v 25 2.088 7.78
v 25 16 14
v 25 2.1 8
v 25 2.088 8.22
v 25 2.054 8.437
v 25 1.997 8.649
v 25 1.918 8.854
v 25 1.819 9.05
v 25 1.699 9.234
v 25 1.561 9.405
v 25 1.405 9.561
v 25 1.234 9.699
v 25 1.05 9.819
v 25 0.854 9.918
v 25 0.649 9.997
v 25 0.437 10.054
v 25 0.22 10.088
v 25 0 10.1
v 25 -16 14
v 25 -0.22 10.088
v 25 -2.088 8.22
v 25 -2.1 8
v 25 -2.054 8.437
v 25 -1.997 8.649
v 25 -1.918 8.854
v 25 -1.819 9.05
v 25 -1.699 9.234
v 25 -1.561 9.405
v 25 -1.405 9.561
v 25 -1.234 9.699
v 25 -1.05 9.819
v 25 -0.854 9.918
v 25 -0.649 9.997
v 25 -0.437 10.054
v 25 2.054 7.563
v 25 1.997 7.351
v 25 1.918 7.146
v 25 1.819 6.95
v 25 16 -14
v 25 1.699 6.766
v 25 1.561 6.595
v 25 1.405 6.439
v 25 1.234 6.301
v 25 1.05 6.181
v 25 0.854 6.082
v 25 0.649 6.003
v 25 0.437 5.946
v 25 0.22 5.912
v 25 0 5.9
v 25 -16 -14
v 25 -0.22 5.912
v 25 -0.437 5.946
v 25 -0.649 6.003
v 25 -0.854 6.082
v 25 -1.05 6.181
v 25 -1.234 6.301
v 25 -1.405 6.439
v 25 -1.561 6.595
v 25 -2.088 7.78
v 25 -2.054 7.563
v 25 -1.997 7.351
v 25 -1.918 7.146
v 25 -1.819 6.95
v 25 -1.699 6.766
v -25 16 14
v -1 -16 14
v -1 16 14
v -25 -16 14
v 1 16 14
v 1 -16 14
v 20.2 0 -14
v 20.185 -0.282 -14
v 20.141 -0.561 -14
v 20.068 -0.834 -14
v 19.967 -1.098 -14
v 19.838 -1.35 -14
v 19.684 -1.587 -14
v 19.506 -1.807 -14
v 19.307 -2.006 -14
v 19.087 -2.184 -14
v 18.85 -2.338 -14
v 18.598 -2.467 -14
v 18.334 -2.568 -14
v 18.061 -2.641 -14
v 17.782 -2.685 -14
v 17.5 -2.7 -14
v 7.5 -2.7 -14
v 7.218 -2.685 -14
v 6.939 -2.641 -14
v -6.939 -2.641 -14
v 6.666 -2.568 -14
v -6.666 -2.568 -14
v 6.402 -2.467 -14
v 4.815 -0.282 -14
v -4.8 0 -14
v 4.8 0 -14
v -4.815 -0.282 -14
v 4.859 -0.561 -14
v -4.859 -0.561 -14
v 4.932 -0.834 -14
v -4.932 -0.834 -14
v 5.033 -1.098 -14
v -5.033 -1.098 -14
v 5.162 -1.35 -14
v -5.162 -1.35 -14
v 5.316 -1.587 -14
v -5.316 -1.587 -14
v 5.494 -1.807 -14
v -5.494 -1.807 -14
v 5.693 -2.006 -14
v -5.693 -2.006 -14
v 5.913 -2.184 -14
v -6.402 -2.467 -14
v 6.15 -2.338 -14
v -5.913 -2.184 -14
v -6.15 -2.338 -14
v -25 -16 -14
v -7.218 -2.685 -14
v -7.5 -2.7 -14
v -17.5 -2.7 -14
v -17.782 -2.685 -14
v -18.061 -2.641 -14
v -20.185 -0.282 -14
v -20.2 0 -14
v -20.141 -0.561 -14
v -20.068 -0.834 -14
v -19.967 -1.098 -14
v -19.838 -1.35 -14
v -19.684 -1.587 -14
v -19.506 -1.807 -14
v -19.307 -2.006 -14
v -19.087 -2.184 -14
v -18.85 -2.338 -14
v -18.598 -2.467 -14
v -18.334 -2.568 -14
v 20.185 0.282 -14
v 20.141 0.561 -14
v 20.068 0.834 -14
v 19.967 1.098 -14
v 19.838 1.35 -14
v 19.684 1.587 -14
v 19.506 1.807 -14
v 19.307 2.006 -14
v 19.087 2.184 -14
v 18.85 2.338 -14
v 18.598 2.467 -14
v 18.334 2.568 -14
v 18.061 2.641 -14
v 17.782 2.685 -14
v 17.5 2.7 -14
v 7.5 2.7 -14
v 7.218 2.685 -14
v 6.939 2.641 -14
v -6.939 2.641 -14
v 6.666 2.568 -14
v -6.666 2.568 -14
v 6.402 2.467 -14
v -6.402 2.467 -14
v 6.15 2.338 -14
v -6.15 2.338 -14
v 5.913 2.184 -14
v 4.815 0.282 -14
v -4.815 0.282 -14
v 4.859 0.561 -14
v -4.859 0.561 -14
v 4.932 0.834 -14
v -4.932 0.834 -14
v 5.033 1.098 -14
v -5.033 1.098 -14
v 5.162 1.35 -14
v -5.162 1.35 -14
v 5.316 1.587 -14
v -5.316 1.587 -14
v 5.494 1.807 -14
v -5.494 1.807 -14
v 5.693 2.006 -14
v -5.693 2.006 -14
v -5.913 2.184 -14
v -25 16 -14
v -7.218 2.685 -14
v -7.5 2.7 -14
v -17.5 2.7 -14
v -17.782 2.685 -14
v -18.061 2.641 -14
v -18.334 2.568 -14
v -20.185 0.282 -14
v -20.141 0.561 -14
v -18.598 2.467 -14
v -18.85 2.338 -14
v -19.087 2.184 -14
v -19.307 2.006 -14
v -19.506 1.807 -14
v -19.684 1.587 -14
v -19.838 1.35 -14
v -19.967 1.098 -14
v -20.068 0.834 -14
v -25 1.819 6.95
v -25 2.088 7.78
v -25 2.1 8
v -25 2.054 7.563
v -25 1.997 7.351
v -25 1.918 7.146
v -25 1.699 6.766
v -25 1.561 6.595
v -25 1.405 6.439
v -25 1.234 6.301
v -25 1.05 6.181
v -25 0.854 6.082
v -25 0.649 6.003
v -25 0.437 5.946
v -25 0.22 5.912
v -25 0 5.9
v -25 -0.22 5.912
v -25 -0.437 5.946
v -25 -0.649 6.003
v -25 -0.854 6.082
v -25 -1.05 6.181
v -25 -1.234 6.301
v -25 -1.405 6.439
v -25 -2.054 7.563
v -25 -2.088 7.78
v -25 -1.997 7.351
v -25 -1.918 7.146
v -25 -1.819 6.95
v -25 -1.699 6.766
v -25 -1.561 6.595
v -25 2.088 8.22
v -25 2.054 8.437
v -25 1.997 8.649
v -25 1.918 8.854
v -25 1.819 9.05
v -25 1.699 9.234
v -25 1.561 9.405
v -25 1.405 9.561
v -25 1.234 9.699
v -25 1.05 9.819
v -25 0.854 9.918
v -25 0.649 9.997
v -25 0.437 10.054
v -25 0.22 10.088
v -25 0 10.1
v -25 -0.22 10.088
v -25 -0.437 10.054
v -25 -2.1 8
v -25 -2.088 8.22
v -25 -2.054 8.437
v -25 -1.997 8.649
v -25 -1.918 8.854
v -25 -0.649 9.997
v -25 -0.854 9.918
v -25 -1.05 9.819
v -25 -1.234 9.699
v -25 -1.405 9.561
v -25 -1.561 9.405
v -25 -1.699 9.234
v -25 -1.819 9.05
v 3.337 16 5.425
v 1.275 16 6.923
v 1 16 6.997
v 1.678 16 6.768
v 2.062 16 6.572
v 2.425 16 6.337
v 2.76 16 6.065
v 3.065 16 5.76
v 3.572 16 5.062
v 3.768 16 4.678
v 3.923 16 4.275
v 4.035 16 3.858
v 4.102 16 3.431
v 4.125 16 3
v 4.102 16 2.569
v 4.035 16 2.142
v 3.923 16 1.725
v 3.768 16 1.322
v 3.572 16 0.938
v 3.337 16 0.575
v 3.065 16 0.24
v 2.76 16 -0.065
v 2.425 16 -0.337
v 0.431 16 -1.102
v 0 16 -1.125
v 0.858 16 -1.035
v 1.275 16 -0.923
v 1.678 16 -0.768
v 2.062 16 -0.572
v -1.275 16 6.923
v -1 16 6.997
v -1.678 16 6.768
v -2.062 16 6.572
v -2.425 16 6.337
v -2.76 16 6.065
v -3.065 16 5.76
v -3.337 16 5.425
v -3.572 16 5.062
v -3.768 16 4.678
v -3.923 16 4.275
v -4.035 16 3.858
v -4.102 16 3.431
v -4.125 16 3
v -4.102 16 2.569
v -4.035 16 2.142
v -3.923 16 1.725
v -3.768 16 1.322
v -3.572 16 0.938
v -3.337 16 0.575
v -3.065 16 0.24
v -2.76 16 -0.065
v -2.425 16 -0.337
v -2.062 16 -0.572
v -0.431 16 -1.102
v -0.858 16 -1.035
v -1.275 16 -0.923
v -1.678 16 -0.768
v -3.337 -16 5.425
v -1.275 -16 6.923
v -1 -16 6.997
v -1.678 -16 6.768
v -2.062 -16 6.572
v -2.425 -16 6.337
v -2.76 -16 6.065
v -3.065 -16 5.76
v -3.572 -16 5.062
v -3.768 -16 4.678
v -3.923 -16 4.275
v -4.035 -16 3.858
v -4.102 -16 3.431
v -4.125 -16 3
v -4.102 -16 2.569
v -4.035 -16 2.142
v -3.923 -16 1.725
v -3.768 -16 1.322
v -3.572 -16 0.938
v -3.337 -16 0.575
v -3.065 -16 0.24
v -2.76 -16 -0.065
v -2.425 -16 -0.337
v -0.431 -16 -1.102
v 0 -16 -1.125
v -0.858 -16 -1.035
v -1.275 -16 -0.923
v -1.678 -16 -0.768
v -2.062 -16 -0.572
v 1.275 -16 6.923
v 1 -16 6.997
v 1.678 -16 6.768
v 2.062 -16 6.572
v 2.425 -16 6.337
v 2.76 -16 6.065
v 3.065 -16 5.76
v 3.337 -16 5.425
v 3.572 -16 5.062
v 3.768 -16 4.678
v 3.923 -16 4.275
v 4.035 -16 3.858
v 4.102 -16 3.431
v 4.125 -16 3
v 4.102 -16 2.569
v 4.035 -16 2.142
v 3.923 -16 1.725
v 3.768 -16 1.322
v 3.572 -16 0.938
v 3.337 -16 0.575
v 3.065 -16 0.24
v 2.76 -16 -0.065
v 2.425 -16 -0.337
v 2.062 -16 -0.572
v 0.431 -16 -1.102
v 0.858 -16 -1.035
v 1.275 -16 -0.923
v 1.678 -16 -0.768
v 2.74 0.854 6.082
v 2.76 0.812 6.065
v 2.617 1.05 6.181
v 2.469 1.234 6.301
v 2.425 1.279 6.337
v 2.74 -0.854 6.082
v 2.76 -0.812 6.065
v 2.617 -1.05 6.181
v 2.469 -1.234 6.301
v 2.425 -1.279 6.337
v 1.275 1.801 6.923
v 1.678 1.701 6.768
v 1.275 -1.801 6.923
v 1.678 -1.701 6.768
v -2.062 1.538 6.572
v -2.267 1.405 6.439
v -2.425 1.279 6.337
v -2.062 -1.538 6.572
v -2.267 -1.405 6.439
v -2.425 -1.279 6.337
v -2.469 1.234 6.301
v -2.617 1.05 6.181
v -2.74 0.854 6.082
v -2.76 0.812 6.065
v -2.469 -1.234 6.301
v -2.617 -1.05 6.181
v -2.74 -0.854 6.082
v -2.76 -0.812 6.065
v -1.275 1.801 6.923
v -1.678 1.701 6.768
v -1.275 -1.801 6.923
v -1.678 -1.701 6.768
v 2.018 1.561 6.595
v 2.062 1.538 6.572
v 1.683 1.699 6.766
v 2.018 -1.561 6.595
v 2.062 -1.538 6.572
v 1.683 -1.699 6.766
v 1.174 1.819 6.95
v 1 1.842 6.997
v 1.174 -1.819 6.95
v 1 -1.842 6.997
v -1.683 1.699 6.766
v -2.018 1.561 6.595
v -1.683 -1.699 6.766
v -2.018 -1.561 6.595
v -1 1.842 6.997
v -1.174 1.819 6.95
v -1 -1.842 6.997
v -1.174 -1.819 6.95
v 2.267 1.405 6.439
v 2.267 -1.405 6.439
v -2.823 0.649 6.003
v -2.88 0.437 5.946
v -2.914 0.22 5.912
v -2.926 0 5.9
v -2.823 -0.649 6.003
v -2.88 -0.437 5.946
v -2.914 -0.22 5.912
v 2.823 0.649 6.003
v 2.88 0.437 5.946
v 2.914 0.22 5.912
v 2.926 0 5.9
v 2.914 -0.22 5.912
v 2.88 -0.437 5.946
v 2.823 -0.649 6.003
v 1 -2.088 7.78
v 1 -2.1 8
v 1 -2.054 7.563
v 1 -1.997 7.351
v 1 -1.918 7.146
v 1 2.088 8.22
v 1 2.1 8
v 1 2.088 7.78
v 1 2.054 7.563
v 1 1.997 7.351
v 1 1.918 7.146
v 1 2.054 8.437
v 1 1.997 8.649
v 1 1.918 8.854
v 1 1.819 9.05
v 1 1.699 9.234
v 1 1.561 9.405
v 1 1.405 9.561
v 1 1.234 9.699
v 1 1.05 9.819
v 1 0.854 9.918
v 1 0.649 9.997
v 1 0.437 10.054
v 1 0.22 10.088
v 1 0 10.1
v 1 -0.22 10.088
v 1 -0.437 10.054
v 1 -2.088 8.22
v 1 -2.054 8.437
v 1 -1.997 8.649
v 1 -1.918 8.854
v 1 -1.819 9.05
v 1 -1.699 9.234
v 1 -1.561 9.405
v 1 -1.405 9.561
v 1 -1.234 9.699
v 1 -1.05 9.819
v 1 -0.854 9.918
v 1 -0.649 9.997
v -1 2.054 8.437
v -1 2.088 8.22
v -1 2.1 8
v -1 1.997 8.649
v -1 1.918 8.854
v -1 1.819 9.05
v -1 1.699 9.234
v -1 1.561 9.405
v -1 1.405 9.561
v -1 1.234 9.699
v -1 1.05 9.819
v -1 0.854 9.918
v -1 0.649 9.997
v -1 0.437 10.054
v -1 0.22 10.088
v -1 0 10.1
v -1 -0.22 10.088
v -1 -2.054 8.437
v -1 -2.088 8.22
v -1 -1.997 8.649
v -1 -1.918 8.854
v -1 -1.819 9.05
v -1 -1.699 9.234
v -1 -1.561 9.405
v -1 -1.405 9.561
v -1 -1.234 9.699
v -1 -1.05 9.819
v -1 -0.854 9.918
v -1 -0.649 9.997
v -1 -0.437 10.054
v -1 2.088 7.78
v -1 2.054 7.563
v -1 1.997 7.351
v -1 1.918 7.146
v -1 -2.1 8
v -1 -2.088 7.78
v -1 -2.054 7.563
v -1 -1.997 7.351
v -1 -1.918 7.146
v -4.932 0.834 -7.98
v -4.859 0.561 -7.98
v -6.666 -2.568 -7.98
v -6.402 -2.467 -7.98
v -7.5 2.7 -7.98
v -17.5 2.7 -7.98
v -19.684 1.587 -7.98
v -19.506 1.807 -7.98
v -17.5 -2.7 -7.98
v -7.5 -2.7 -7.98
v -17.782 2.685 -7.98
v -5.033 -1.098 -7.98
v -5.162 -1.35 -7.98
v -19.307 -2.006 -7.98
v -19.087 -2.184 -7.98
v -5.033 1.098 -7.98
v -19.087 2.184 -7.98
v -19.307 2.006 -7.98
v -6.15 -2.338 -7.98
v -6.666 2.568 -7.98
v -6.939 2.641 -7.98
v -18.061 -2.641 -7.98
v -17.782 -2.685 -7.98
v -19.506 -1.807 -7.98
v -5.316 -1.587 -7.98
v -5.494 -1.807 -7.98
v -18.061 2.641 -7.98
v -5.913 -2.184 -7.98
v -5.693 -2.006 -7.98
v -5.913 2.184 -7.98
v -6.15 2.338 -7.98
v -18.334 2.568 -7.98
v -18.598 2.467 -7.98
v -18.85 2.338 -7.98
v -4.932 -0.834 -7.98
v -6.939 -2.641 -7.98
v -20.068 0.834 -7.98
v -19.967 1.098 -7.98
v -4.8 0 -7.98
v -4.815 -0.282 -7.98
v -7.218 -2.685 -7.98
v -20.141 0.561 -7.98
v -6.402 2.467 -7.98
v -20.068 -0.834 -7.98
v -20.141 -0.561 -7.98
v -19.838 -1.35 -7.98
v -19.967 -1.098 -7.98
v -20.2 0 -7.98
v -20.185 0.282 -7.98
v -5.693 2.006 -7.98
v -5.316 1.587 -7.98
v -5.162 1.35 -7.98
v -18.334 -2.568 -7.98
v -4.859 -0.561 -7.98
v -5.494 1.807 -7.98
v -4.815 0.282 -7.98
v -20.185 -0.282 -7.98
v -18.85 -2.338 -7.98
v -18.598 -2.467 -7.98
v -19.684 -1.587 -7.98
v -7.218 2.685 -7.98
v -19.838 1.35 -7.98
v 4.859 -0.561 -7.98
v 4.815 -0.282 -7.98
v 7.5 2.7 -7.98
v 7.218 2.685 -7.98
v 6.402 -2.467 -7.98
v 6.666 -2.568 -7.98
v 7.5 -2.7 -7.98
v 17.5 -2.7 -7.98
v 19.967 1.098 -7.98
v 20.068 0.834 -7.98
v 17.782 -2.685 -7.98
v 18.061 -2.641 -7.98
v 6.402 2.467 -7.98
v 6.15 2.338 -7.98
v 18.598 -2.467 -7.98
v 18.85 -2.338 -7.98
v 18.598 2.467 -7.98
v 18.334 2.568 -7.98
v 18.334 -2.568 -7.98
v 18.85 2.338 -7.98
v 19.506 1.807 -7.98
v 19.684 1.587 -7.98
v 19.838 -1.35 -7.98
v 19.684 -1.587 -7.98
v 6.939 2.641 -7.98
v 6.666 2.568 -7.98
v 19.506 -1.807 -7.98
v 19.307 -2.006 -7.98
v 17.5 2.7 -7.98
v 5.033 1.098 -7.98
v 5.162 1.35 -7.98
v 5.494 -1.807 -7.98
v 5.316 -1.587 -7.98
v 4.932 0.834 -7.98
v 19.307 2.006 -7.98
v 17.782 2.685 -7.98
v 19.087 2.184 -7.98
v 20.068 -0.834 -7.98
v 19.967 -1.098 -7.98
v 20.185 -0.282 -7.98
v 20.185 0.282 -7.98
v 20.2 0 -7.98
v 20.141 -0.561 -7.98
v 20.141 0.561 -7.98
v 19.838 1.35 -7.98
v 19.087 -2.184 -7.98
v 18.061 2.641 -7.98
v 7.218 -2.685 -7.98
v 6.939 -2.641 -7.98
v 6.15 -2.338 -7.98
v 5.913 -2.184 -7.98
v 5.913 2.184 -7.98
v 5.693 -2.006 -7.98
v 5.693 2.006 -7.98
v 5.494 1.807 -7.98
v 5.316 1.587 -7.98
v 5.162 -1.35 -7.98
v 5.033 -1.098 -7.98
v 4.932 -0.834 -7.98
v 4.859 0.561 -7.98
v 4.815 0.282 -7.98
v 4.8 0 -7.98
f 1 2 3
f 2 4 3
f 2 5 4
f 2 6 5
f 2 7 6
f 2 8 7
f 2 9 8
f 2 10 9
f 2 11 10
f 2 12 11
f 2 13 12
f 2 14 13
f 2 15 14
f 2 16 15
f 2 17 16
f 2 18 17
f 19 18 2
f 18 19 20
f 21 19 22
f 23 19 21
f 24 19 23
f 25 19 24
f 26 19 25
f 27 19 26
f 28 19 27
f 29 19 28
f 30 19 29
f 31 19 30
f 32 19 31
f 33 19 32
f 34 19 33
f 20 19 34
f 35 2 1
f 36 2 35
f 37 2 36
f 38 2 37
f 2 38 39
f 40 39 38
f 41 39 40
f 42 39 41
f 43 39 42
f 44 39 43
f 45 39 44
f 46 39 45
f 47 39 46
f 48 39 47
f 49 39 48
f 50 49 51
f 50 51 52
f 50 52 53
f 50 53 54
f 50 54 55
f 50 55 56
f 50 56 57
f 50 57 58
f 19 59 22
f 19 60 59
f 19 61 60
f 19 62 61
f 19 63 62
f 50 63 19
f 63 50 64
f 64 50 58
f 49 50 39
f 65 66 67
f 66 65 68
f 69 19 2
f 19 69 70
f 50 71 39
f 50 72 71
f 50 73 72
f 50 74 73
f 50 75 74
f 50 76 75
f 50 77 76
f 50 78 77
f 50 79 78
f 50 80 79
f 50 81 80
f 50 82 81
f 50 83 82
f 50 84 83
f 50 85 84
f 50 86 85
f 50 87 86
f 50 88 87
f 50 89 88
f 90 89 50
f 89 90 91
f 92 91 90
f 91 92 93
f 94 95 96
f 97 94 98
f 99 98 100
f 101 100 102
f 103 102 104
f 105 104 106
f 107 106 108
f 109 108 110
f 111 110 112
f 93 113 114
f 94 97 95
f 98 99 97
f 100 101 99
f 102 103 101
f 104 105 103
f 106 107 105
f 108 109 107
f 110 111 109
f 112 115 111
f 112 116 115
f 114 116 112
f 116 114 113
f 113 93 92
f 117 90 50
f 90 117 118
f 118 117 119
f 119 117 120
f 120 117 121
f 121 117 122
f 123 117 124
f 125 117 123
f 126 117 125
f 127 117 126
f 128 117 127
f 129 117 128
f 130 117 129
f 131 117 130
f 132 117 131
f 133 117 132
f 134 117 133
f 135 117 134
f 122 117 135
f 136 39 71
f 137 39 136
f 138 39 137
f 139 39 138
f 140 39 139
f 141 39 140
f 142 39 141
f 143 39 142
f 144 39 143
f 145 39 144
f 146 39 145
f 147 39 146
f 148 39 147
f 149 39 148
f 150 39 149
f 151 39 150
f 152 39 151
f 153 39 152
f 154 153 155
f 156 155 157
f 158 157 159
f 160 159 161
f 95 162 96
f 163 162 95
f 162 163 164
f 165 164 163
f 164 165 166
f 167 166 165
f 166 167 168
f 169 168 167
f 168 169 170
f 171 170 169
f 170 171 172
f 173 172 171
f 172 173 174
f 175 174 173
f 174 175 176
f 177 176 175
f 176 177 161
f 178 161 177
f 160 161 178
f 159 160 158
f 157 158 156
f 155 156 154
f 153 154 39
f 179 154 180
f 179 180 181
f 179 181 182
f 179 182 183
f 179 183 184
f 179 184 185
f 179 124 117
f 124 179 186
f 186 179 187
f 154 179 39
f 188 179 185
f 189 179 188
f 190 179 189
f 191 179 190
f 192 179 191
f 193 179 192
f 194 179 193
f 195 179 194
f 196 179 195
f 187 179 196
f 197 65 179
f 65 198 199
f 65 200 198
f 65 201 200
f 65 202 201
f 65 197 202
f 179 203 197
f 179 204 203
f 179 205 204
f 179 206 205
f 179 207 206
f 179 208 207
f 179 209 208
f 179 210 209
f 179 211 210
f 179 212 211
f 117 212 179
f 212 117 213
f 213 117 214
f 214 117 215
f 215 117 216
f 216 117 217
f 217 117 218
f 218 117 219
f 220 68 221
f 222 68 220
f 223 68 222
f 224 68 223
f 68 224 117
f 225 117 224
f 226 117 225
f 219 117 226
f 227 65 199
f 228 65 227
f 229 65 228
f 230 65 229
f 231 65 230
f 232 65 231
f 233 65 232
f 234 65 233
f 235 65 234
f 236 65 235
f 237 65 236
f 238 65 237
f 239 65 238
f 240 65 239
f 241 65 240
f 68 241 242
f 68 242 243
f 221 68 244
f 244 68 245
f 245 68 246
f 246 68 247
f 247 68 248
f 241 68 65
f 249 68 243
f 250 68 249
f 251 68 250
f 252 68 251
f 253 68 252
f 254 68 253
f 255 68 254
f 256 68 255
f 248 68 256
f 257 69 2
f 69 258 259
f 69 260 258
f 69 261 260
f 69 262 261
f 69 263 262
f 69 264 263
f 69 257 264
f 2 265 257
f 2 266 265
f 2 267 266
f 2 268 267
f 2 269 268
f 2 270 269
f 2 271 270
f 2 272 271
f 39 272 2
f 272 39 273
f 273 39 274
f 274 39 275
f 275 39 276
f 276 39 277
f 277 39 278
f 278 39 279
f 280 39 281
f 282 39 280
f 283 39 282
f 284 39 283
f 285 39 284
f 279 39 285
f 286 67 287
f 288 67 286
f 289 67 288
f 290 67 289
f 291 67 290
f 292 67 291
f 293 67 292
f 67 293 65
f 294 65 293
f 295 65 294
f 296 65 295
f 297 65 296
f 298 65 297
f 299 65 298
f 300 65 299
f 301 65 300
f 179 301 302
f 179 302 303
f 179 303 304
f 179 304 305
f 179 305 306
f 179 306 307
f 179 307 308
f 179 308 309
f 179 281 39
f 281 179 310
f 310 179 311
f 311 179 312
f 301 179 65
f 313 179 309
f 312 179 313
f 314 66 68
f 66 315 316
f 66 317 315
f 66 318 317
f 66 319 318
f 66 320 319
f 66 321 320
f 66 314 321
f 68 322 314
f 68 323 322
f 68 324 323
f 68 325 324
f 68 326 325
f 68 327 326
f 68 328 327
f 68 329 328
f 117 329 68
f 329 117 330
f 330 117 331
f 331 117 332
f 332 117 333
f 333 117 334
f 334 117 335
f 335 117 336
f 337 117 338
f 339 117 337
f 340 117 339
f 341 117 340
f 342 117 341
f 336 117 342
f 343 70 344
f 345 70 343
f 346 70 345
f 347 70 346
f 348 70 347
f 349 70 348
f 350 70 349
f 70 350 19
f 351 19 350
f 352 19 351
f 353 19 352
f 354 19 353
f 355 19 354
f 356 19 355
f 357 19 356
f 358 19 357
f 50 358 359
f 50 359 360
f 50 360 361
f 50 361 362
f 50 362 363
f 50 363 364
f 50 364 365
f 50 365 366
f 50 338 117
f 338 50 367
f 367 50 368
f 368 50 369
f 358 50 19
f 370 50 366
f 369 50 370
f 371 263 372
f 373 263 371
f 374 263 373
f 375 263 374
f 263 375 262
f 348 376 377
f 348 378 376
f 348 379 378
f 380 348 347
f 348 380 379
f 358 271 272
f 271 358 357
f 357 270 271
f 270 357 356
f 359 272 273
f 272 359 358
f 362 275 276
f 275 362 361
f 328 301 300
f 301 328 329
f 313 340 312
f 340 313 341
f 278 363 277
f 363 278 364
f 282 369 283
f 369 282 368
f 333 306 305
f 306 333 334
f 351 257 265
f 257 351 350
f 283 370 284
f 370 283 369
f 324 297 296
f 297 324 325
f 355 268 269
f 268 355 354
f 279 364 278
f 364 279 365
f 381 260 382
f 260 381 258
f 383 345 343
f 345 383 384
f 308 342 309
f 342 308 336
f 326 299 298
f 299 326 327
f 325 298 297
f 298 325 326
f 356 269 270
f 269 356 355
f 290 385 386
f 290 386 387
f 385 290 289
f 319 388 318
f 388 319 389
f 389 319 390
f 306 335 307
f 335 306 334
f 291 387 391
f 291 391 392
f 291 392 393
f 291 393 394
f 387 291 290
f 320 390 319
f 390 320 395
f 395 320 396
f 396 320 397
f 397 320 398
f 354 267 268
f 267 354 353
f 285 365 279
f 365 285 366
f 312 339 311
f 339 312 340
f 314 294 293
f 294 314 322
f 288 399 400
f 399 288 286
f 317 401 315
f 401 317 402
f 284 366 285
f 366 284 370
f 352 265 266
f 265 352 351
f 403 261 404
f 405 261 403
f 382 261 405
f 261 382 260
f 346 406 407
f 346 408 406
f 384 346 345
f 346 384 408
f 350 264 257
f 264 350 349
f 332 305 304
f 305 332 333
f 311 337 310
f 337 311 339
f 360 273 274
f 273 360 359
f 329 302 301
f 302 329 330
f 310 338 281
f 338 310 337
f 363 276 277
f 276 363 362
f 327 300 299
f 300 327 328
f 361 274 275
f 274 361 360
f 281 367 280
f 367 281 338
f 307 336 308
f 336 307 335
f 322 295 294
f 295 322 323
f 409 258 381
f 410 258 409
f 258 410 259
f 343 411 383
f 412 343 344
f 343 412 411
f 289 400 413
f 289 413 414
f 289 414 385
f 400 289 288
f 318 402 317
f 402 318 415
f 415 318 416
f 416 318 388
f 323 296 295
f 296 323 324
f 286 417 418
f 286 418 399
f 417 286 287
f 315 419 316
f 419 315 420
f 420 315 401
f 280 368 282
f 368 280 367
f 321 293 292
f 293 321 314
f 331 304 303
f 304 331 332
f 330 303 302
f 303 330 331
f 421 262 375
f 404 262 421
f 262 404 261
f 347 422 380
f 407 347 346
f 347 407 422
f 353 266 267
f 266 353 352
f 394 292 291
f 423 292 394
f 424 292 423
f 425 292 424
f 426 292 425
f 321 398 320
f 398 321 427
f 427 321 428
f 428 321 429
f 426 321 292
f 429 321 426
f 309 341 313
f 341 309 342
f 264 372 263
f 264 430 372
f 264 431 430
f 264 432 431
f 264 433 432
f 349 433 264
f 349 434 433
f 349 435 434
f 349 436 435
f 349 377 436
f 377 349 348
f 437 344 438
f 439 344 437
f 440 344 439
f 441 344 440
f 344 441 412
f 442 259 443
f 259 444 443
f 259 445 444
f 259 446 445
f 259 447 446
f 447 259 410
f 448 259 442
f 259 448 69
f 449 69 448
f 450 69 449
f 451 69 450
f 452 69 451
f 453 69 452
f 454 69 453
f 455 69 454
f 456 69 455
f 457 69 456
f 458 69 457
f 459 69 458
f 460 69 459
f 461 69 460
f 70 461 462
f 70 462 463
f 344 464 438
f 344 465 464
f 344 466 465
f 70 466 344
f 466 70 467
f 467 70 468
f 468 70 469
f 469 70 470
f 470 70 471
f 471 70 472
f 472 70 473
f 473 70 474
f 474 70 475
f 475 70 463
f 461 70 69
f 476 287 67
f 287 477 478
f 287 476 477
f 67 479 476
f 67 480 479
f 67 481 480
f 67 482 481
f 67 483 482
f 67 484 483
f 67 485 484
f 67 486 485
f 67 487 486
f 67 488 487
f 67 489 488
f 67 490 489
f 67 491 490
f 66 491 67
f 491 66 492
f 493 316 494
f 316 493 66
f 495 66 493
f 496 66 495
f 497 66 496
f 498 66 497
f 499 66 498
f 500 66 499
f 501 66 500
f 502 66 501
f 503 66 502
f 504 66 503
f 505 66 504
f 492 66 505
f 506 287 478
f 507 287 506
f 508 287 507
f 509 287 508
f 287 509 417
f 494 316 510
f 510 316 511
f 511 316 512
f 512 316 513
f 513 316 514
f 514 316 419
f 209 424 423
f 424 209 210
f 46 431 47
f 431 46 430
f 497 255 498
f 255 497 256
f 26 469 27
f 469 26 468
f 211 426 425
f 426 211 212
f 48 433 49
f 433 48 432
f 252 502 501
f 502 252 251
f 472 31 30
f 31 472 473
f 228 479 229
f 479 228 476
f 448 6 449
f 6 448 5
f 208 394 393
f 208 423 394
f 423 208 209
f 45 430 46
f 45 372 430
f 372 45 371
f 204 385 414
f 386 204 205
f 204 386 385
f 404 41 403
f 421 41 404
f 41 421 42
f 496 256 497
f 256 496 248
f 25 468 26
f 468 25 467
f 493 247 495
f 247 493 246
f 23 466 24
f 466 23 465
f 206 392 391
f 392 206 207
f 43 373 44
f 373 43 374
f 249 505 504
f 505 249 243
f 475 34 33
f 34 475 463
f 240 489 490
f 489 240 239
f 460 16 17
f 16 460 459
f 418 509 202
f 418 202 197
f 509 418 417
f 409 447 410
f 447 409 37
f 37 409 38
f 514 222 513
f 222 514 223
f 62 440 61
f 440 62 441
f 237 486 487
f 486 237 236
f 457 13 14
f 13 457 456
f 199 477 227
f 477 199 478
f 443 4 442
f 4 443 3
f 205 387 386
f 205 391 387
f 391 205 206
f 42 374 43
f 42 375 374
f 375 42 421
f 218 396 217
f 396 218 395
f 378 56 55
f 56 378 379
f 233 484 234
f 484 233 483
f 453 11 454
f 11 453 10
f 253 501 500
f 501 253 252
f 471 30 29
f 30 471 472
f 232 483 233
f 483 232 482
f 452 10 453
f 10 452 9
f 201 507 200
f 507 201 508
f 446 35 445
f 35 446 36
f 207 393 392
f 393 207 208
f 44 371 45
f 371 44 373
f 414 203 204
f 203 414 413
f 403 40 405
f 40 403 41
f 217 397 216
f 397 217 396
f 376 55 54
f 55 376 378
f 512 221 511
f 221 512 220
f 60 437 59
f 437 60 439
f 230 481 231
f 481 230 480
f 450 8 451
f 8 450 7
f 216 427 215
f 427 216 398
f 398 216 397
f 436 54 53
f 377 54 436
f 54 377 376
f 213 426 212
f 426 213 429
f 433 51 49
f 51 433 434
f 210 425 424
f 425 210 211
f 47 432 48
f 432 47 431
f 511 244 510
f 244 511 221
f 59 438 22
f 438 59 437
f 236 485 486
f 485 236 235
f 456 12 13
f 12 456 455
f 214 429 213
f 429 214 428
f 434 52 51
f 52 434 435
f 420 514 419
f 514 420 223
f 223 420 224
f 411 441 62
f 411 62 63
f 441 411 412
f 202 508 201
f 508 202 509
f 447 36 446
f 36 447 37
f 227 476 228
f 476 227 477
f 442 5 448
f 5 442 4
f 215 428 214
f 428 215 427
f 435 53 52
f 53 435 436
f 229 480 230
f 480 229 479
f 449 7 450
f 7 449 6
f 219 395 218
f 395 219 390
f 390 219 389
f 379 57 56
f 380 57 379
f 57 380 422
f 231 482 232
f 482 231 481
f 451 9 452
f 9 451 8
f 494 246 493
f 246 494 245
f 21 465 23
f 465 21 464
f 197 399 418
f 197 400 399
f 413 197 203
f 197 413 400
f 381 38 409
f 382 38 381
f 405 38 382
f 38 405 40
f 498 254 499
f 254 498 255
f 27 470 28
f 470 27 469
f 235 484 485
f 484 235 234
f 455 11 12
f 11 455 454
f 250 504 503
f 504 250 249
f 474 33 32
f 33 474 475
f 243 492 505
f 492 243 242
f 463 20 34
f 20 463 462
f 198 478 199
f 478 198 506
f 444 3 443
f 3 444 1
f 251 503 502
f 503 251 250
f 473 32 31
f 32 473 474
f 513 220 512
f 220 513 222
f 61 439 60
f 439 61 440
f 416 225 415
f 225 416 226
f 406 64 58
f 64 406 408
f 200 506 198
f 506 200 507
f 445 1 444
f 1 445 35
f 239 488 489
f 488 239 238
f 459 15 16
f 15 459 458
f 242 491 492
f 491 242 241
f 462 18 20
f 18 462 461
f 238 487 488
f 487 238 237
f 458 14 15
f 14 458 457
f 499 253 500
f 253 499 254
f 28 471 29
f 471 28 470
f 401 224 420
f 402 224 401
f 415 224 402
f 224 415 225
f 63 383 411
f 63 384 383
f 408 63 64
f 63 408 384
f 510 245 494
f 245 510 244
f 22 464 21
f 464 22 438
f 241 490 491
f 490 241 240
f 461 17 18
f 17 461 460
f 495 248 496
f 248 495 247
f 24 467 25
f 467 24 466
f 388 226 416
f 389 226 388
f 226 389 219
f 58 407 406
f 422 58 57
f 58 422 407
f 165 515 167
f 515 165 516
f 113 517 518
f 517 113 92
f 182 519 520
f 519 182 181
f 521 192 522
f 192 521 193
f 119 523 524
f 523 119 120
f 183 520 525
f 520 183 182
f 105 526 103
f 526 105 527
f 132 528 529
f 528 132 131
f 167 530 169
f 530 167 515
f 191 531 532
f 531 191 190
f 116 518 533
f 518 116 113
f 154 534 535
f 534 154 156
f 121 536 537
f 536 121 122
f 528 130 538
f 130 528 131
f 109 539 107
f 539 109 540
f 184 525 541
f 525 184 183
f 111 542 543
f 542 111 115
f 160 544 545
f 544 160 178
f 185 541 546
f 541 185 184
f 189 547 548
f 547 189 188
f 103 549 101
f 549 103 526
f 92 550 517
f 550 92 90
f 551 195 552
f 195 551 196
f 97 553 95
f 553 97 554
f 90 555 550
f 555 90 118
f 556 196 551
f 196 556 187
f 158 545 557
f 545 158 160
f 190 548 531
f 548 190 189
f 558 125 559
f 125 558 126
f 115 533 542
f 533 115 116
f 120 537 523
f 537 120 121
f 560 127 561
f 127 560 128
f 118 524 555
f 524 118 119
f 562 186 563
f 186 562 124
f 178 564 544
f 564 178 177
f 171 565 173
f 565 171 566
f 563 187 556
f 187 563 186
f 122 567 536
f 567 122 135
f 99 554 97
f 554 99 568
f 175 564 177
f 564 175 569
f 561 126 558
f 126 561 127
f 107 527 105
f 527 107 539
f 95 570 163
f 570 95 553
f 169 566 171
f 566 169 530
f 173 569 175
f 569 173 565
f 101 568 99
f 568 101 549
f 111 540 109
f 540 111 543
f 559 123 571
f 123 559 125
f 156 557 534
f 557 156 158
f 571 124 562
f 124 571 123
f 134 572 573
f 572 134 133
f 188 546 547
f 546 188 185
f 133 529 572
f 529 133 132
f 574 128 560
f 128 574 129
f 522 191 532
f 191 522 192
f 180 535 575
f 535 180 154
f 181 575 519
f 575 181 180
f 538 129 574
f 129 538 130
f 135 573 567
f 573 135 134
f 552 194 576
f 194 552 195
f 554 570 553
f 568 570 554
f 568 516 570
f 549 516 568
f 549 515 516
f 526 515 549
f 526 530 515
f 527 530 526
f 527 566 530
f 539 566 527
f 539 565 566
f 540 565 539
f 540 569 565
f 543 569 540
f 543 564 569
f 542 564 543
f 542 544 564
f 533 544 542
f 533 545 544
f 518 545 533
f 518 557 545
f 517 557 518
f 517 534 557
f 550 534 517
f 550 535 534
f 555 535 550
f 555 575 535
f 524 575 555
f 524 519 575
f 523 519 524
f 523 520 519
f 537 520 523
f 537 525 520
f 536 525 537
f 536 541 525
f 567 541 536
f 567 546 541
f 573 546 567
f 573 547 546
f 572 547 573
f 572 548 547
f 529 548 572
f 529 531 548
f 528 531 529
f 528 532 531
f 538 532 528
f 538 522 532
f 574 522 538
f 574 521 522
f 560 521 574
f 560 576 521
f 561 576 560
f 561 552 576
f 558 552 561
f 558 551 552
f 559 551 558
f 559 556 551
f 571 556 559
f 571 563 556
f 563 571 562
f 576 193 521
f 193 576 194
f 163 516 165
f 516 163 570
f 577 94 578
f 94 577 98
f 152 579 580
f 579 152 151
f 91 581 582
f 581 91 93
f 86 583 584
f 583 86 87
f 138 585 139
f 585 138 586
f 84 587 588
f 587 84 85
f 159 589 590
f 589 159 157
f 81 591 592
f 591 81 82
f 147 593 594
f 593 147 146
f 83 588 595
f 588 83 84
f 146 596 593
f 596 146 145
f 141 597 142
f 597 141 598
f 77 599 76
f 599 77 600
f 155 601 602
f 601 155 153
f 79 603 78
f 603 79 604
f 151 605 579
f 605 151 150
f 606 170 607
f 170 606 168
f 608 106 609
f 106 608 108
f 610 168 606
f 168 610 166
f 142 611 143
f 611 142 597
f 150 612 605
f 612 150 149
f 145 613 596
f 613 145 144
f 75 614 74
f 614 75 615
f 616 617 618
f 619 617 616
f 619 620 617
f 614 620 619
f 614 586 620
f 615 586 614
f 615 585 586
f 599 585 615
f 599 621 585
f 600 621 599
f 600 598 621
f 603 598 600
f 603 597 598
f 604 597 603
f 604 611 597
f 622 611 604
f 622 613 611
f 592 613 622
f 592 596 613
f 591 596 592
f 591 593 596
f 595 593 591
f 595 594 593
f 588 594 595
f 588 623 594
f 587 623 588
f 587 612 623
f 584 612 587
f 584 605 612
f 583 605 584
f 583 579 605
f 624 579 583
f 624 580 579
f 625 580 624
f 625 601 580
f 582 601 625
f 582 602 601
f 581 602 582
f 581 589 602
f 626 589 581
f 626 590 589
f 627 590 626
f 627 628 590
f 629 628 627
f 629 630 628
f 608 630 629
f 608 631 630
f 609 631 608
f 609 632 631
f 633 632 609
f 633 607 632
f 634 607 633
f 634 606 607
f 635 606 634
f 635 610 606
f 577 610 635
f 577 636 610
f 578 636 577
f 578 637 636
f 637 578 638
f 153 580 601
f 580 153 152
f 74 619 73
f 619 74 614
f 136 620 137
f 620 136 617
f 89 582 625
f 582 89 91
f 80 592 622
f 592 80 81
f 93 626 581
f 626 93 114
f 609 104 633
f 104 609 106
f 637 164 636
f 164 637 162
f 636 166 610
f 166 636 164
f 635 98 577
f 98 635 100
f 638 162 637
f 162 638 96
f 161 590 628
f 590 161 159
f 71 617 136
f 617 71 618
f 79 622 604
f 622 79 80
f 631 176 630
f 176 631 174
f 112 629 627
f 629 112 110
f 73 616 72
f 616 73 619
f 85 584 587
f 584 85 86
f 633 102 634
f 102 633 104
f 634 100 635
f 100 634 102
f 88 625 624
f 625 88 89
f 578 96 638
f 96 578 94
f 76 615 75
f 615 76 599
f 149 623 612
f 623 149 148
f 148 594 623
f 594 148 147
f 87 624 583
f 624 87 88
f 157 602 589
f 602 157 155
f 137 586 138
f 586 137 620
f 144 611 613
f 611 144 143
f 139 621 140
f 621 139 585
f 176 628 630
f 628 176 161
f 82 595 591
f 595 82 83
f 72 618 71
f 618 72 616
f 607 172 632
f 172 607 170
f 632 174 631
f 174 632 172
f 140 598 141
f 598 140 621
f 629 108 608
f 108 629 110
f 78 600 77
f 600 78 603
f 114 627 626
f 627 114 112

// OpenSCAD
// Clamp pedestal for 8 mm shaft.
$fn = 60;
eps = 0.02;
shaft_d = 8;
body_l = 50;
body_d = 32;
body_h = 28;
base_t = 6;
slot_w = 2;
mount_d = 5.4;
module mount_slot(x) {
    hull() {
        translate([x - 5, 0, -body_h / 2 - eps]) cylinder(d = mount_d, h = base_t + 2 * eps);
        translate([x + 5, 0, -body_h / 2 - eps]) cylinder(d = mount_d, h = base_t + 2 * eps);
    }
}
difference() {
    cube([body_l, body_d, body_h], center = true);
    translate([0, -body_d / 2 - eps, 3]) rotate([-90, 0, 0]) cylinder(d = shaft_d + 0.25, h = body_d + 2 * eps);
    translate([-slot_w / 2, -body_d / 2 - eps, 3]) cube([slot_w, body_d + 2 * eps, body_h / 2 + eps]);
    translate([-body_l / 2 - eps, 0, body_h / 2 - 6]) rotate([0, 90, 0]) cylinder(d = 4.2, h = body_l + 2 * eps);
    mount_slot(-body_l / 4);
    mount_slot(body_l / 4);
}
